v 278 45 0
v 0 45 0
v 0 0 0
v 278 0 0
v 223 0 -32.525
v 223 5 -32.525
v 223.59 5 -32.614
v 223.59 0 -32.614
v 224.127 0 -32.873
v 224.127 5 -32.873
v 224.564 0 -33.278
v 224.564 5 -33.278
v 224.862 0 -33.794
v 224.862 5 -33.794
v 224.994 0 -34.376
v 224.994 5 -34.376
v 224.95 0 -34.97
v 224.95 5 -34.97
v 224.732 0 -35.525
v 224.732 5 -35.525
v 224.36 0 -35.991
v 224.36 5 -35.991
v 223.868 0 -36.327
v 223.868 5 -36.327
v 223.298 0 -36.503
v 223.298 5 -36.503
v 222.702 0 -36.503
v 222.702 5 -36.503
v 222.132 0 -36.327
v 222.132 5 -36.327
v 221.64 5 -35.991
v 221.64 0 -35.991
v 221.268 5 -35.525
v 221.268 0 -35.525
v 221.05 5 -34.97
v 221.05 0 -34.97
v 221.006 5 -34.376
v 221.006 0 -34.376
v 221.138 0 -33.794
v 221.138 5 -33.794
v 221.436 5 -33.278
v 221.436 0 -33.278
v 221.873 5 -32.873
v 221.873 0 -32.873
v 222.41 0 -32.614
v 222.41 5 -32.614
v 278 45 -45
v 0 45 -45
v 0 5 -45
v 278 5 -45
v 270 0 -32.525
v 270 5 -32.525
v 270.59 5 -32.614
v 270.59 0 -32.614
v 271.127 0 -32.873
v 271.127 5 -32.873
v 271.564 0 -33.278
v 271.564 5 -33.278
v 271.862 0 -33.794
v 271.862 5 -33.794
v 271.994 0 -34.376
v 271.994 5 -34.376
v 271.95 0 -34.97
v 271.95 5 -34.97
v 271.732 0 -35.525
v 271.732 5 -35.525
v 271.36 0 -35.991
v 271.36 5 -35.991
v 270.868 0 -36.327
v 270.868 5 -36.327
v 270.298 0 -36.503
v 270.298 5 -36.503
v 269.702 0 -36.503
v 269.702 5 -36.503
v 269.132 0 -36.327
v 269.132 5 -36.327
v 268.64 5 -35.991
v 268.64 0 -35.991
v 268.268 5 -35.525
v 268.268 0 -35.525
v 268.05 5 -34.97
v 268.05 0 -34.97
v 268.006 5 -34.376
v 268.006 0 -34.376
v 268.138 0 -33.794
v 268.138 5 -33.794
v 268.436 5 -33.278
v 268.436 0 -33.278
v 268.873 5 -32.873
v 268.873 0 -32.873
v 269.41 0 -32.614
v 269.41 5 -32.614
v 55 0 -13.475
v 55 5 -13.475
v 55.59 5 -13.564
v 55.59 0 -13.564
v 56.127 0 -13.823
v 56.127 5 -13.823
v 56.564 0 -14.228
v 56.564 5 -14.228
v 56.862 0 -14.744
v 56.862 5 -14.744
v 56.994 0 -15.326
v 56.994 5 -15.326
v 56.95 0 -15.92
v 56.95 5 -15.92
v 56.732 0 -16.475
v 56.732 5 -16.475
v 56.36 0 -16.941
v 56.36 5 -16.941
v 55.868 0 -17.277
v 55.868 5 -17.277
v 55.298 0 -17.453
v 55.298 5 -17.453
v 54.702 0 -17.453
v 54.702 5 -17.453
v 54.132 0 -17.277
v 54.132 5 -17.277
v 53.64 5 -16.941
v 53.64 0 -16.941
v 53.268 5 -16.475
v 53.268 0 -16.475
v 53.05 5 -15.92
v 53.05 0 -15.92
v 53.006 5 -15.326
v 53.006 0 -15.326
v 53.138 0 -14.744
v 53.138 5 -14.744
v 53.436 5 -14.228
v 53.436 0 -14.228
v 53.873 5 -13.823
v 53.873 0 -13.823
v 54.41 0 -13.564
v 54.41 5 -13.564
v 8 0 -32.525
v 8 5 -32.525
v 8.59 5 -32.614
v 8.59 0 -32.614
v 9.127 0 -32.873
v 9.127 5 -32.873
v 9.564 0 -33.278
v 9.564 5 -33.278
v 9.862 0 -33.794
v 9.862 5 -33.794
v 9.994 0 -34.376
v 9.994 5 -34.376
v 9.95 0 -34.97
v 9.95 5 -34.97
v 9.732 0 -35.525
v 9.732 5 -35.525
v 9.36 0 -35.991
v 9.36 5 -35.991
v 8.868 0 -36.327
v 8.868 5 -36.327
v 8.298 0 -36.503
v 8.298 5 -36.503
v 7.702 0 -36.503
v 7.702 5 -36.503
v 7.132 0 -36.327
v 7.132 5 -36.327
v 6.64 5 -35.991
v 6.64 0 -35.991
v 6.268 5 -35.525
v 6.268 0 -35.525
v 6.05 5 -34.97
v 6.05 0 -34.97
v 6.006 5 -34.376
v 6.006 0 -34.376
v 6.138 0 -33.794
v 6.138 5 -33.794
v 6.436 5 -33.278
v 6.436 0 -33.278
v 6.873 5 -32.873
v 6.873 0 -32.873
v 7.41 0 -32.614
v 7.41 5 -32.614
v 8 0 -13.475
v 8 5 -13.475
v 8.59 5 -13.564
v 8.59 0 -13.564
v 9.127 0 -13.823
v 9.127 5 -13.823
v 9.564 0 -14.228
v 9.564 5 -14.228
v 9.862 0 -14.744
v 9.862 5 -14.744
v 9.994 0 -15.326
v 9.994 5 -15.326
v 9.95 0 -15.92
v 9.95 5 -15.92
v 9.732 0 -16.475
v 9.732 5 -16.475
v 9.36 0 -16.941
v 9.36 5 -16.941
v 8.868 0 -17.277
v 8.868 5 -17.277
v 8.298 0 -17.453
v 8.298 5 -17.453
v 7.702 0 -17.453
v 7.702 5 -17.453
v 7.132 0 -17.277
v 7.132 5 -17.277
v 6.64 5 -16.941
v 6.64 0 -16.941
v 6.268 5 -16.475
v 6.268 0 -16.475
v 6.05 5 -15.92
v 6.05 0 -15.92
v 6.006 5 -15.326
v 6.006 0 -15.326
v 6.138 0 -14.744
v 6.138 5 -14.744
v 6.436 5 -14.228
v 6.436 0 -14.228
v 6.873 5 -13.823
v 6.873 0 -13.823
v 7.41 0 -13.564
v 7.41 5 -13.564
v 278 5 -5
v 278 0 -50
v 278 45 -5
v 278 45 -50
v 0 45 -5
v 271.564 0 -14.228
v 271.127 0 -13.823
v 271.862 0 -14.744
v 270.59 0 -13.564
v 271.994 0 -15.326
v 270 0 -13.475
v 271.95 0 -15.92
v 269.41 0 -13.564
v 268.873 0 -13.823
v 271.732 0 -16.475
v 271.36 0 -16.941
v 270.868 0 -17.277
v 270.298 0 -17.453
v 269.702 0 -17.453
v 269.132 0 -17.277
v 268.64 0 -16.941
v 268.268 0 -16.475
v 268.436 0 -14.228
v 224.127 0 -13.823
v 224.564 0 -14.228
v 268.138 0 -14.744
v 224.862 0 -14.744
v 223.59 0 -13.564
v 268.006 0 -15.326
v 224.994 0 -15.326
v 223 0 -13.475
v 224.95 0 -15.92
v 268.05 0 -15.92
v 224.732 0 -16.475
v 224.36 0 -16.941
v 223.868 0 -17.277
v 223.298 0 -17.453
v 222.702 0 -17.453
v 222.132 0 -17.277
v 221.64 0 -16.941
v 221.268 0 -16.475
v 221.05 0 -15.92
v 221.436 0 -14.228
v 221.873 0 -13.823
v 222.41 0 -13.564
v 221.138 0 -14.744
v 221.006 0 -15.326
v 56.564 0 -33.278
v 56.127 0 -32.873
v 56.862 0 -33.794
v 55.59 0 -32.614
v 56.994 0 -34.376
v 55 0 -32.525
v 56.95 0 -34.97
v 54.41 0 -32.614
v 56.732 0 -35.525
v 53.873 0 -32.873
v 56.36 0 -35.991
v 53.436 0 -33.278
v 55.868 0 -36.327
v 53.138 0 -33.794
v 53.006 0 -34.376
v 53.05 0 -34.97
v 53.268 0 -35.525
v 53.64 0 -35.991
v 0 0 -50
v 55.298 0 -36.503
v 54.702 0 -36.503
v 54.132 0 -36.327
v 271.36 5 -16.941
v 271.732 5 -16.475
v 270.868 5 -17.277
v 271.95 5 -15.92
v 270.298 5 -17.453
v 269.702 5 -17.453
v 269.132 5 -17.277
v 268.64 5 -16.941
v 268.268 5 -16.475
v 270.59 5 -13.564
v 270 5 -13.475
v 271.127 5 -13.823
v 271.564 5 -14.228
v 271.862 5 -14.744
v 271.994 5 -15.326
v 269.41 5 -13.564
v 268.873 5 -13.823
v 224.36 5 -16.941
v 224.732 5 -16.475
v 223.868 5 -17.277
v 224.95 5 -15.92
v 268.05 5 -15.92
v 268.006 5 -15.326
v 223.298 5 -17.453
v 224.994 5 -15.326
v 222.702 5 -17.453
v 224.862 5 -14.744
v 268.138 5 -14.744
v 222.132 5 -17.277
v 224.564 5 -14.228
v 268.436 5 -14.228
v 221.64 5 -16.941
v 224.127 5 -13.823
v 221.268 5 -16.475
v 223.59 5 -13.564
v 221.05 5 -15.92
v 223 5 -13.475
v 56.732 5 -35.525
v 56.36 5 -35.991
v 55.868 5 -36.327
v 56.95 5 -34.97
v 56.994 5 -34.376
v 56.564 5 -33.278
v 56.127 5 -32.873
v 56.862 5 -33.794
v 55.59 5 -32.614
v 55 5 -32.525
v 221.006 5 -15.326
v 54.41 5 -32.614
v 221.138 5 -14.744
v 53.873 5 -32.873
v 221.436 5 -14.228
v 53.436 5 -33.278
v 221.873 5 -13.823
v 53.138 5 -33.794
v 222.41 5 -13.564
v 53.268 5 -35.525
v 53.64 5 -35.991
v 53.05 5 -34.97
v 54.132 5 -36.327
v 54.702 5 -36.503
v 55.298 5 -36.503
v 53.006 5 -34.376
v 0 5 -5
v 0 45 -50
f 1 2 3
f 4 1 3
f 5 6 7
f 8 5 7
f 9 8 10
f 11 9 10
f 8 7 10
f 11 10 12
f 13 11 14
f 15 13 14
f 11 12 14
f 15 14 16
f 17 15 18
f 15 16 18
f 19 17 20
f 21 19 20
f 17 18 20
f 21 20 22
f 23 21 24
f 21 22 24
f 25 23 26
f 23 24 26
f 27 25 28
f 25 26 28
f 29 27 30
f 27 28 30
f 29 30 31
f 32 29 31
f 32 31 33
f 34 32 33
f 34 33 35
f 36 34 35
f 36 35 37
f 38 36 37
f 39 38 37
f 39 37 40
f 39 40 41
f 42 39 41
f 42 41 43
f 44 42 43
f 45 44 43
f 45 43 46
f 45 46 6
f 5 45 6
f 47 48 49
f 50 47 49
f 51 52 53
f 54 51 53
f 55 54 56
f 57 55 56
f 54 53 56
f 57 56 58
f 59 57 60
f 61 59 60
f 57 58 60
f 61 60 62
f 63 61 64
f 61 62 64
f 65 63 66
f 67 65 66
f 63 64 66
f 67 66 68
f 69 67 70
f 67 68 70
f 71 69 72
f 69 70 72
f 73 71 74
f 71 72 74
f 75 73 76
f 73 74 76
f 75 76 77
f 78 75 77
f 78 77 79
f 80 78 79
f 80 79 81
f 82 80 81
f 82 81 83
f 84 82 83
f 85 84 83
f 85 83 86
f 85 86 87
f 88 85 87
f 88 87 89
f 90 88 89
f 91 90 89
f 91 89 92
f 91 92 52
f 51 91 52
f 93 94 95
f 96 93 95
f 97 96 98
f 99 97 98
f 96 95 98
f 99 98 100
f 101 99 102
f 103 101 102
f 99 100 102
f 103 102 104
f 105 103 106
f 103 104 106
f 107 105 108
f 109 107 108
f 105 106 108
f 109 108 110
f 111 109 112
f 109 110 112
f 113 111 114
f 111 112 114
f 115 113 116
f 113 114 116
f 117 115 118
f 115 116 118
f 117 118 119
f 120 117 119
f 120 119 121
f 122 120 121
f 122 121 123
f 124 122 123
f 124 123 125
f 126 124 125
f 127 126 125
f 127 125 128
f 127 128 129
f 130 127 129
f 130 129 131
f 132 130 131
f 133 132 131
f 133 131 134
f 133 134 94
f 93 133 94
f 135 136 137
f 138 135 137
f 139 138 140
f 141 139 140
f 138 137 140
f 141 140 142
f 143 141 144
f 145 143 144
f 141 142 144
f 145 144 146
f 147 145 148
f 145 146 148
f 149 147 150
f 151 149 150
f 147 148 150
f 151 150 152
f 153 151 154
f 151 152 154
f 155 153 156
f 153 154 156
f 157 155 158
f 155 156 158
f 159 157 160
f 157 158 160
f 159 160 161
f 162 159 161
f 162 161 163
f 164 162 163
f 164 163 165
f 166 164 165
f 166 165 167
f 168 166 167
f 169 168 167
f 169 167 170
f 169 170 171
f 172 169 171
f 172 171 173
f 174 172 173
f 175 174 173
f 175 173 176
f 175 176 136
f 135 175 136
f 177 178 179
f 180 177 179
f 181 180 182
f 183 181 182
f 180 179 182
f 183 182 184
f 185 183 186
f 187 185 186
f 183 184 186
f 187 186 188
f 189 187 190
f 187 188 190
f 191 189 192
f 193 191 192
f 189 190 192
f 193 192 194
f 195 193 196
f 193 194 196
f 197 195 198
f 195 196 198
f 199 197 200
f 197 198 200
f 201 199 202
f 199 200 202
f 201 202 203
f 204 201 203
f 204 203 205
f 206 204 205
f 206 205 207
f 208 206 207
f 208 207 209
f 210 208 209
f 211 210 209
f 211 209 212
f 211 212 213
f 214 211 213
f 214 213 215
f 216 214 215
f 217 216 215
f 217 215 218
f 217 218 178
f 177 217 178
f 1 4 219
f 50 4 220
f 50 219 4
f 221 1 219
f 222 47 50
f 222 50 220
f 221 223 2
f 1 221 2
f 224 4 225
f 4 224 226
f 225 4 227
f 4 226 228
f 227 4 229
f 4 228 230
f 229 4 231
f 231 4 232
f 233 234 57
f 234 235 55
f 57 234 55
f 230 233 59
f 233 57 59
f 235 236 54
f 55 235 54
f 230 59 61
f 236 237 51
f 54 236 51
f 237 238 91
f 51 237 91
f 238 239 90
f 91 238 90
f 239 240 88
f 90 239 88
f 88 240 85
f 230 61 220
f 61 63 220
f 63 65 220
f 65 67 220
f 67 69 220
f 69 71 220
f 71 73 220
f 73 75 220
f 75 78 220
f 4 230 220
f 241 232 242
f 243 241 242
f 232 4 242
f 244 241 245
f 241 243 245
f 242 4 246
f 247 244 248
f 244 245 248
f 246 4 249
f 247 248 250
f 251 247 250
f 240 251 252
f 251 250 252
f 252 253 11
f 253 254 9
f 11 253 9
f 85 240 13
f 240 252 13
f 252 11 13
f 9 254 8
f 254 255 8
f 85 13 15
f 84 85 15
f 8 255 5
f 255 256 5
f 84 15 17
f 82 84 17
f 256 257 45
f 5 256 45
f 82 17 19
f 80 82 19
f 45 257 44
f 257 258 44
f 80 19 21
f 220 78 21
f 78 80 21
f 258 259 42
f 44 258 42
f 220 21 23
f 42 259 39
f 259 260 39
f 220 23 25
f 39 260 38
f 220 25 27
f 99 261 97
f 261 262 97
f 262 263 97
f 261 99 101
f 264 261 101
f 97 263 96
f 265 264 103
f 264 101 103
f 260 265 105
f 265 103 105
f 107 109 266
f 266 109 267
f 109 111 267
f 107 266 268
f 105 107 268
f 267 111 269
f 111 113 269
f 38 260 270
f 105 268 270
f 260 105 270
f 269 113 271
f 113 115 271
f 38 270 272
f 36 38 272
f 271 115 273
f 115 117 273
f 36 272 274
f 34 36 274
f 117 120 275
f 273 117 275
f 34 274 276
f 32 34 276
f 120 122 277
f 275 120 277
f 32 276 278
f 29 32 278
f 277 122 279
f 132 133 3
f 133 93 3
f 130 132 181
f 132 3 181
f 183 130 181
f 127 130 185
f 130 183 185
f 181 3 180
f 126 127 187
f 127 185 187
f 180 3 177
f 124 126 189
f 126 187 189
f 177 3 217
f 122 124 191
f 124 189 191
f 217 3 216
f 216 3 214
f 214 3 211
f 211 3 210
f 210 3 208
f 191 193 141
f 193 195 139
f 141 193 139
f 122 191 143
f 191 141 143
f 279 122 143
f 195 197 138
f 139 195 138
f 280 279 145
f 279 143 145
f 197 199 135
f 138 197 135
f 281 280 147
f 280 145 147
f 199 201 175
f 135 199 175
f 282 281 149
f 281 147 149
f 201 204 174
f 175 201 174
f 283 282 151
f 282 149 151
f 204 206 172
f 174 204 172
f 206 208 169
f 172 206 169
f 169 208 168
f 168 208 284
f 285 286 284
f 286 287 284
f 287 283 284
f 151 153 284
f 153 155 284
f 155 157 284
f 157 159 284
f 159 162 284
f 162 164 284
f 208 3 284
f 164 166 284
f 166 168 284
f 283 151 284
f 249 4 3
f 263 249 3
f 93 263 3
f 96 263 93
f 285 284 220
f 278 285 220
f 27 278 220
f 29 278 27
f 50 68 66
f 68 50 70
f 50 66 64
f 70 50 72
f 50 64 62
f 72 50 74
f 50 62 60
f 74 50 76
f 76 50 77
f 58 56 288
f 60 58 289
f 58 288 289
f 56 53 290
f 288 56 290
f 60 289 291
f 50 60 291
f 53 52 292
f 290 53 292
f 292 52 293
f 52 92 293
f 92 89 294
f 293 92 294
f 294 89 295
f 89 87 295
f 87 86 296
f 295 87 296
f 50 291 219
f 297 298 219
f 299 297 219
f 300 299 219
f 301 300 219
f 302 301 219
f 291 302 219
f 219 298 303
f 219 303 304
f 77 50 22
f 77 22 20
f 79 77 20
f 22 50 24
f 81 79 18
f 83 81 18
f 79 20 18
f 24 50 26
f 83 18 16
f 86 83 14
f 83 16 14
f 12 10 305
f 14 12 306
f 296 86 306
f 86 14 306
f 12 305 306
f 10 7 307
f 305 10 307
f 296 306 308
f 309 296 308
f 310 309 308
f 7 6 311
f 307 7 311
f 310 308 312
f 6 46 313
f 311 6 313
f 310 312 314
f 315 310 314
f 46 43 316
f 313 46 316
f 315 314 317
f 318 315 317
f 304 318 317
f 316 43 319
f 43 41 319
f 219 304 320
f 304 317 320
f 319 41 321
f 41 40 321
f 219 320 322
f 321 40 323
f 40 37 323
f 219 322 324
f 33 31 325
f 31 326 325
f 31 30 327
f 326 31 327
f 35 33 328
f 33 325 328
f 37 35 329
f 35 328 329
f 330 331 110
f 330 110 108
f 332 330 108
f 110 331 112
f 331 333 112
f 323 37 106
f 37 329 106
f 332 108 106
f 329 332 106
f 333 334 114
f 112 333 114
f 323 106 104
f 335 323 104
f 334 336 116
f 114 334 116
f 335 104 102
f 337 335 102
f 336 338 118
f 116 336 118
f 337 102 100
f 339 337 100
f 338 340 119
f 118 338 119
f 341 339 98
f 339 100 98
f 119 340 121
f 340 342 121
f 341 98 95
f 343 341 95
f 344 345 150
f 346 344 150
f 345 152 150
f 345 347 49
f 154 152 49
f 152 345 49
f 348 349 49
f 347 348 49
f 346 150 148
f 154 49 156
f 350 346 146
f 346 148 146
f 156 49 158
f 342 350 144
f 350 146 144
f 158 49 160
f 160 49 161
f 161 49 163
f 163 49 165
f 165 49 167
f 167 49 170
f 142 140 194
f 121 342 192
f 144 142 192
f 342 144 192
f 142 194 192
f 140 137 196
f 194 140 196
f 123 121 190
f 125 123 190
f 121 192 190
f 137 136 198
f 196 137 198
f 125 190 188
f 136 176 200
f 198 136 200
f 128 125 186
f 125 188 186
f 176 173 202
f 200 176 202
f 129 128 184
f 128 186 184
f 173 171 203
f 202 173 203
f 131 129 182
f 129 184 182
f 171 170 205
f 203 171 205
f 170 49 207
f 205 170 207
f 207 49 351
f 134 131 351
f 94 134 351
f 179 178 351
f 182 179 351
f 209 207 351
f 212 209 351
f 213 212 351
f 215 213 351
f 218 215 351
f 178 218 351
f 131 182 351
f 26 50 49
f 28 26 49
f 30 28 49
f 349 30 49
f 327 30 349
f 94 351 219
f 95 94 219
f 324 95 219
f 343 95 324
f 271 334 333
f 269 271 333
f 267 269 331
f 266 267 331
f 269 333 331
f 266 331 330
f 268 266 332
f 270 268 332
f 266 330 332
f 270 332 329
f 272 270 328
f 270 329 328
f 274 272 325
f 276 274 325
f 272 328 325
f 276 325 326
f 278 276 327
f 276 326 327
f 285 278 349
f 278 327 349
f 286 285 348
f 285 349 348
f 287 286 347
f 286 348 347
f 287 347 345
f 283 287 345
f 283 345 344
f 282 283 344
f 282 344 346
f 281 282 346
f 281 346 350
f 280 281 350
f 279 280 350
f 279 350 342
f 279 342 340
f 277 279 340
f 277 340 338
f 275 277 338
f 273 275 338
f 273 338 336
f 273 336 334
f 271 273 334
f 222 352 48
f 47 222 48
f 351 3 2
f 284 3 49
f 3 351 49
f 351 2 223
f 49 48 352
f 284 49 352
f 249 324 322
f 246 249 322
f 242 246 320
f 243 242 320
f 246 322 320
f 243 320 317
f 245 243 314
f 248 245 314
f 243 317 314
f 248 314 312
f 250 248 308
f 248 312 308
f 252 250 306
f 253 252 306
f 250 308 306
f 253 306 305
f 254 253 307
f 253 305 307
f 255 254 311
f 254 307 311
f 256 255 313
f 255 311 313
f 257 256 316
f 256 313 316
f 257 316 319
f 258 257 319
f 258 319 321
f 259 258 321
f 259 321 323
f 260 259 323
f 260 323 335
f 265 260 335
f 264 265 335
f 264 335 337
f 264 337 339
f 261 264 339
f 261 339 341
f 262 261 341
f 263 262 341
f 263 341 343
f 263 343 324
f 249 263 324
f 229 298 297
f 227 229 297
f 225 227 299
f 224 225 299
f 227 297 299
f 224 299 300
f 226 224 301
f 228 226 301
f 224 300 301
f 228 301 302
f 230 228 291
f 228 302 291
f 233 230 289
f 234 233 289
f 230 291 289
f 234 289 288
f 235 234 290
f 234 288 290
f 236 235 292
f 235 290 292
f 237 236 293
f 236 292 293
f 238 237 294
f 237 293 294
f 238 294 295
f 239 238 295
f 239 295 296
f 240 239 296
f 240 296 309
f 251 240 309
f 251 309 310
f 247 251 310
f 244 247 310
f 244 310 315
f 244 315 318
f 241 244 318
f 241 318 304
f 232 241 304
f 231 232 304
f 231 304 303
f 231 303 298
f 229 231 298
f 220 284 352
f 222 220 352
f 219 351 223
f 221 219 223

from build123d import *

# Parameters (mm, degrees)
BOSS_EXTRUDE1_DEPTH = 278
CUT_EXTRUDE3_REACH  = 287.279
SKETCH2_R           = 2


with BuildPart() as part:
    # Sketch1 → Boss-Extrude1 (new body)
    with BuildSketch(Plane(origin=(0, 0, 0), x_dir=(0, 0, -1), z_dir=(1, 0, 0))):
        Polygon((0, 0), (50, 0), (50, 45), (45, 45), (45, 5), (5, 5), (5, 45), (0, 45), align=None)
    extrude(amount=BOSS_EXTRUDE1_DEPTH)

    # Sketch2 → Cut-Extrude3 (cut, up to next)
    with BuildSketch(Plane(origin=(0, 5, 0), x_dir=(1, 0, 0), z_dir=(0, 1, 0)), mode=Mode.PRIVATE) as cut_extrude3_sk1:
        with Locations(Location((8, 15.475, 0), (0, 0, 270))):
            Circle(SKETCH2_R)
    cut_extrude3_tool1 = extrude(cut_extrude3_sk1.sketch, amount=-CUT_EXTRUDE3_REACH, mode=Mode.PRIVATE) & part.part
    # Sketch2 → Cut-Extrude3 (cut, up to next)
    with BuildSketch(Plane(origin=(0, 5, 0), x_dir=(1, 0, 0), z_dir=(0, 1, 0)), mode=Mode.PRIVATE) as cut_extrude3_sk2:
        with Locations(Location((55, 15.475, 0), (0, 0, 270))):
            Circle(SKETCH2_R)
    cut_extrude3_tool2 = extrude(cut_extrude3_sk2.sketch, amount=-CUT_EXTRUDE3_REACH, mode=Mode.PRIVATE) & part.part
    # Sketch2 → Cut-Extrude3 (cut, up to next)
    with BuildSketch(Plane(origin=(0, 5, 0), x_dir=(1, 0, 0), z_dir=(0, 1, 0)), mode=Mode.PRIVATE) as cut_extrude3_sk3:
        with Locations(Location((55, 34.525, 0), (0, 0, 270))):
            Circle(SKETCH2_R)
    cut_extrude3_tool3 = extrude(cut_extrude3_sk3.sketch, amount=-CUT_EXTRUDE3_REACH, mode=Mode.PRIVATE) & part.part
    # Sketch2 → Cut-Extrude3 (cut, up to next)
    with BuildSketch(Plane(origin=(0, 5, 0), x_dir=(1, 0, 0), z_dir=(0, 1, 0)), mode=Mode.PRIVATE) as cut_extrude3_sk4:
        with Locations(Location((8, 34.525, 0), (0, 0, 270))):
            Circle(SKETCH2_R)
    cut_extrude3_tool4 = extrude(cut_extrude3_sk4.sketch, amount=-CUT_EXTRUDE3_REACH, mode=Mode.PRIVATE) & part.part
    # Sketch2 → Cut-Extrude3 (cut, up to next)
    with BuildSketch(Plane(origin=(0, 5, 0), x_dir=(1, 0, 0), z_dir=(0, 1, 0)), mode=Mode.PRIVATE) as cut_extrude3_sk5:
        with Locations(Location((270, 34.525, 0), (0, 0, 270))):
            Circle(SKETCH2_R)
    cut_extrude3_tool5 = extrude(cut_extrude3_sk5.sketch, amount=-CUT_EXTRUDE3_REACH, mode=Mode.PRIVATE) & part.part
    # Sketch2 → Cut-Extrude3 (cut, up to next)
    with BuildSketch(Plane(origin=(0, 5, 0), x_dir=(1, 0, 0), z_dir=(0, 1, 0)), mode=Mode.PRIVATE) as cut_extrude3_sk6:
        with Locations(Location((223, 34.525, 0), (0, 0, 270))):
            Circle(SKETCH2_R)
    cut_extrude3_tool6 = extrude(cut_extrude3_sk6.sketch, amount=-CUT_EXTRUDE3_REACH, mode=Mode.PRIVATE) & part.part
    # Sketch2 → Cut-Extrude3 (cut, up to next)
    with BuildSketch(Plane(origin=(0, 5, 0), x_dir=(1, 0, 0), z_dir=(0, 1, 0)), mode=Mode.PRIVATE) as cut_extrude3_sk7:
        with Locations(Location((223, 15.475, 0), (0, 0, 270))):
            Circle(SKETCH2_R)
    cut_extrude3_tool7 = extrude(cut_extrude3_sk7.sketch, amount=-CUT_EXTRUDE3_REACH, mode=Mode.PRIVATE) & part.part
    # Sketch2 → Cut-Extrude3 (cut, up to next)
    with BuildSketch(Plane(origin=(0, 5, 0), x_dir=(1, 0, 0), z_dir=(0, 1, 0)), mode=Mode.PRIVATE) as cut_extrude3_sk8:
        with Locations(Location((270, 15.475, 0), (0, 0, 270))):
            Circle(SKETCH2_R)
    cut_extrude3_tool8 = extrude(cut_extrude3_sk8.sketch, amount=-CUT_EXTRUDE3_REACH, mode=Mode.PRIVATE) & part.part
    add(cut_extrude3_tool1.solids().sort_by_distance((8, 5, -15.475))[0], mode=Mode.SUBTRACT)
    add(cut_extrude3_tool2.solids().sort_by_distance((55, 5, -15.475))[0], mode=Mode.SUBTRACT)
    add(cut_extrude3_tool3.solids().sort_by_distance((55, 5, -34.525))[0], mode=Mode.SUBTRACT)
    add(cut_extrude3_tool4.solids().sort_by_distance((8, 5, -34.525))[0], mode=Mode.SUBTRACT)
    add(cut_extrude3_tool5.solids().sort_by_distance((270, 5, -34.525))[0], mode=Mode.SUBTRACT)
    add(cut_extrude3_tool6.solids().sort_by_distance((223, 5, -34.525))[0], mode=Mode.SUBTRACT)
    add(cut_extrude3_tool7.solids().sort_by_distance((223, 5, -15.475))[0], mode=Mode.SUBTRACT)
    add(cut_extrude3_tool8.solids().sort_by_distance((270, 5, -15.475))[0], mode=Mode.SUBTRACT)


solid = part.part
